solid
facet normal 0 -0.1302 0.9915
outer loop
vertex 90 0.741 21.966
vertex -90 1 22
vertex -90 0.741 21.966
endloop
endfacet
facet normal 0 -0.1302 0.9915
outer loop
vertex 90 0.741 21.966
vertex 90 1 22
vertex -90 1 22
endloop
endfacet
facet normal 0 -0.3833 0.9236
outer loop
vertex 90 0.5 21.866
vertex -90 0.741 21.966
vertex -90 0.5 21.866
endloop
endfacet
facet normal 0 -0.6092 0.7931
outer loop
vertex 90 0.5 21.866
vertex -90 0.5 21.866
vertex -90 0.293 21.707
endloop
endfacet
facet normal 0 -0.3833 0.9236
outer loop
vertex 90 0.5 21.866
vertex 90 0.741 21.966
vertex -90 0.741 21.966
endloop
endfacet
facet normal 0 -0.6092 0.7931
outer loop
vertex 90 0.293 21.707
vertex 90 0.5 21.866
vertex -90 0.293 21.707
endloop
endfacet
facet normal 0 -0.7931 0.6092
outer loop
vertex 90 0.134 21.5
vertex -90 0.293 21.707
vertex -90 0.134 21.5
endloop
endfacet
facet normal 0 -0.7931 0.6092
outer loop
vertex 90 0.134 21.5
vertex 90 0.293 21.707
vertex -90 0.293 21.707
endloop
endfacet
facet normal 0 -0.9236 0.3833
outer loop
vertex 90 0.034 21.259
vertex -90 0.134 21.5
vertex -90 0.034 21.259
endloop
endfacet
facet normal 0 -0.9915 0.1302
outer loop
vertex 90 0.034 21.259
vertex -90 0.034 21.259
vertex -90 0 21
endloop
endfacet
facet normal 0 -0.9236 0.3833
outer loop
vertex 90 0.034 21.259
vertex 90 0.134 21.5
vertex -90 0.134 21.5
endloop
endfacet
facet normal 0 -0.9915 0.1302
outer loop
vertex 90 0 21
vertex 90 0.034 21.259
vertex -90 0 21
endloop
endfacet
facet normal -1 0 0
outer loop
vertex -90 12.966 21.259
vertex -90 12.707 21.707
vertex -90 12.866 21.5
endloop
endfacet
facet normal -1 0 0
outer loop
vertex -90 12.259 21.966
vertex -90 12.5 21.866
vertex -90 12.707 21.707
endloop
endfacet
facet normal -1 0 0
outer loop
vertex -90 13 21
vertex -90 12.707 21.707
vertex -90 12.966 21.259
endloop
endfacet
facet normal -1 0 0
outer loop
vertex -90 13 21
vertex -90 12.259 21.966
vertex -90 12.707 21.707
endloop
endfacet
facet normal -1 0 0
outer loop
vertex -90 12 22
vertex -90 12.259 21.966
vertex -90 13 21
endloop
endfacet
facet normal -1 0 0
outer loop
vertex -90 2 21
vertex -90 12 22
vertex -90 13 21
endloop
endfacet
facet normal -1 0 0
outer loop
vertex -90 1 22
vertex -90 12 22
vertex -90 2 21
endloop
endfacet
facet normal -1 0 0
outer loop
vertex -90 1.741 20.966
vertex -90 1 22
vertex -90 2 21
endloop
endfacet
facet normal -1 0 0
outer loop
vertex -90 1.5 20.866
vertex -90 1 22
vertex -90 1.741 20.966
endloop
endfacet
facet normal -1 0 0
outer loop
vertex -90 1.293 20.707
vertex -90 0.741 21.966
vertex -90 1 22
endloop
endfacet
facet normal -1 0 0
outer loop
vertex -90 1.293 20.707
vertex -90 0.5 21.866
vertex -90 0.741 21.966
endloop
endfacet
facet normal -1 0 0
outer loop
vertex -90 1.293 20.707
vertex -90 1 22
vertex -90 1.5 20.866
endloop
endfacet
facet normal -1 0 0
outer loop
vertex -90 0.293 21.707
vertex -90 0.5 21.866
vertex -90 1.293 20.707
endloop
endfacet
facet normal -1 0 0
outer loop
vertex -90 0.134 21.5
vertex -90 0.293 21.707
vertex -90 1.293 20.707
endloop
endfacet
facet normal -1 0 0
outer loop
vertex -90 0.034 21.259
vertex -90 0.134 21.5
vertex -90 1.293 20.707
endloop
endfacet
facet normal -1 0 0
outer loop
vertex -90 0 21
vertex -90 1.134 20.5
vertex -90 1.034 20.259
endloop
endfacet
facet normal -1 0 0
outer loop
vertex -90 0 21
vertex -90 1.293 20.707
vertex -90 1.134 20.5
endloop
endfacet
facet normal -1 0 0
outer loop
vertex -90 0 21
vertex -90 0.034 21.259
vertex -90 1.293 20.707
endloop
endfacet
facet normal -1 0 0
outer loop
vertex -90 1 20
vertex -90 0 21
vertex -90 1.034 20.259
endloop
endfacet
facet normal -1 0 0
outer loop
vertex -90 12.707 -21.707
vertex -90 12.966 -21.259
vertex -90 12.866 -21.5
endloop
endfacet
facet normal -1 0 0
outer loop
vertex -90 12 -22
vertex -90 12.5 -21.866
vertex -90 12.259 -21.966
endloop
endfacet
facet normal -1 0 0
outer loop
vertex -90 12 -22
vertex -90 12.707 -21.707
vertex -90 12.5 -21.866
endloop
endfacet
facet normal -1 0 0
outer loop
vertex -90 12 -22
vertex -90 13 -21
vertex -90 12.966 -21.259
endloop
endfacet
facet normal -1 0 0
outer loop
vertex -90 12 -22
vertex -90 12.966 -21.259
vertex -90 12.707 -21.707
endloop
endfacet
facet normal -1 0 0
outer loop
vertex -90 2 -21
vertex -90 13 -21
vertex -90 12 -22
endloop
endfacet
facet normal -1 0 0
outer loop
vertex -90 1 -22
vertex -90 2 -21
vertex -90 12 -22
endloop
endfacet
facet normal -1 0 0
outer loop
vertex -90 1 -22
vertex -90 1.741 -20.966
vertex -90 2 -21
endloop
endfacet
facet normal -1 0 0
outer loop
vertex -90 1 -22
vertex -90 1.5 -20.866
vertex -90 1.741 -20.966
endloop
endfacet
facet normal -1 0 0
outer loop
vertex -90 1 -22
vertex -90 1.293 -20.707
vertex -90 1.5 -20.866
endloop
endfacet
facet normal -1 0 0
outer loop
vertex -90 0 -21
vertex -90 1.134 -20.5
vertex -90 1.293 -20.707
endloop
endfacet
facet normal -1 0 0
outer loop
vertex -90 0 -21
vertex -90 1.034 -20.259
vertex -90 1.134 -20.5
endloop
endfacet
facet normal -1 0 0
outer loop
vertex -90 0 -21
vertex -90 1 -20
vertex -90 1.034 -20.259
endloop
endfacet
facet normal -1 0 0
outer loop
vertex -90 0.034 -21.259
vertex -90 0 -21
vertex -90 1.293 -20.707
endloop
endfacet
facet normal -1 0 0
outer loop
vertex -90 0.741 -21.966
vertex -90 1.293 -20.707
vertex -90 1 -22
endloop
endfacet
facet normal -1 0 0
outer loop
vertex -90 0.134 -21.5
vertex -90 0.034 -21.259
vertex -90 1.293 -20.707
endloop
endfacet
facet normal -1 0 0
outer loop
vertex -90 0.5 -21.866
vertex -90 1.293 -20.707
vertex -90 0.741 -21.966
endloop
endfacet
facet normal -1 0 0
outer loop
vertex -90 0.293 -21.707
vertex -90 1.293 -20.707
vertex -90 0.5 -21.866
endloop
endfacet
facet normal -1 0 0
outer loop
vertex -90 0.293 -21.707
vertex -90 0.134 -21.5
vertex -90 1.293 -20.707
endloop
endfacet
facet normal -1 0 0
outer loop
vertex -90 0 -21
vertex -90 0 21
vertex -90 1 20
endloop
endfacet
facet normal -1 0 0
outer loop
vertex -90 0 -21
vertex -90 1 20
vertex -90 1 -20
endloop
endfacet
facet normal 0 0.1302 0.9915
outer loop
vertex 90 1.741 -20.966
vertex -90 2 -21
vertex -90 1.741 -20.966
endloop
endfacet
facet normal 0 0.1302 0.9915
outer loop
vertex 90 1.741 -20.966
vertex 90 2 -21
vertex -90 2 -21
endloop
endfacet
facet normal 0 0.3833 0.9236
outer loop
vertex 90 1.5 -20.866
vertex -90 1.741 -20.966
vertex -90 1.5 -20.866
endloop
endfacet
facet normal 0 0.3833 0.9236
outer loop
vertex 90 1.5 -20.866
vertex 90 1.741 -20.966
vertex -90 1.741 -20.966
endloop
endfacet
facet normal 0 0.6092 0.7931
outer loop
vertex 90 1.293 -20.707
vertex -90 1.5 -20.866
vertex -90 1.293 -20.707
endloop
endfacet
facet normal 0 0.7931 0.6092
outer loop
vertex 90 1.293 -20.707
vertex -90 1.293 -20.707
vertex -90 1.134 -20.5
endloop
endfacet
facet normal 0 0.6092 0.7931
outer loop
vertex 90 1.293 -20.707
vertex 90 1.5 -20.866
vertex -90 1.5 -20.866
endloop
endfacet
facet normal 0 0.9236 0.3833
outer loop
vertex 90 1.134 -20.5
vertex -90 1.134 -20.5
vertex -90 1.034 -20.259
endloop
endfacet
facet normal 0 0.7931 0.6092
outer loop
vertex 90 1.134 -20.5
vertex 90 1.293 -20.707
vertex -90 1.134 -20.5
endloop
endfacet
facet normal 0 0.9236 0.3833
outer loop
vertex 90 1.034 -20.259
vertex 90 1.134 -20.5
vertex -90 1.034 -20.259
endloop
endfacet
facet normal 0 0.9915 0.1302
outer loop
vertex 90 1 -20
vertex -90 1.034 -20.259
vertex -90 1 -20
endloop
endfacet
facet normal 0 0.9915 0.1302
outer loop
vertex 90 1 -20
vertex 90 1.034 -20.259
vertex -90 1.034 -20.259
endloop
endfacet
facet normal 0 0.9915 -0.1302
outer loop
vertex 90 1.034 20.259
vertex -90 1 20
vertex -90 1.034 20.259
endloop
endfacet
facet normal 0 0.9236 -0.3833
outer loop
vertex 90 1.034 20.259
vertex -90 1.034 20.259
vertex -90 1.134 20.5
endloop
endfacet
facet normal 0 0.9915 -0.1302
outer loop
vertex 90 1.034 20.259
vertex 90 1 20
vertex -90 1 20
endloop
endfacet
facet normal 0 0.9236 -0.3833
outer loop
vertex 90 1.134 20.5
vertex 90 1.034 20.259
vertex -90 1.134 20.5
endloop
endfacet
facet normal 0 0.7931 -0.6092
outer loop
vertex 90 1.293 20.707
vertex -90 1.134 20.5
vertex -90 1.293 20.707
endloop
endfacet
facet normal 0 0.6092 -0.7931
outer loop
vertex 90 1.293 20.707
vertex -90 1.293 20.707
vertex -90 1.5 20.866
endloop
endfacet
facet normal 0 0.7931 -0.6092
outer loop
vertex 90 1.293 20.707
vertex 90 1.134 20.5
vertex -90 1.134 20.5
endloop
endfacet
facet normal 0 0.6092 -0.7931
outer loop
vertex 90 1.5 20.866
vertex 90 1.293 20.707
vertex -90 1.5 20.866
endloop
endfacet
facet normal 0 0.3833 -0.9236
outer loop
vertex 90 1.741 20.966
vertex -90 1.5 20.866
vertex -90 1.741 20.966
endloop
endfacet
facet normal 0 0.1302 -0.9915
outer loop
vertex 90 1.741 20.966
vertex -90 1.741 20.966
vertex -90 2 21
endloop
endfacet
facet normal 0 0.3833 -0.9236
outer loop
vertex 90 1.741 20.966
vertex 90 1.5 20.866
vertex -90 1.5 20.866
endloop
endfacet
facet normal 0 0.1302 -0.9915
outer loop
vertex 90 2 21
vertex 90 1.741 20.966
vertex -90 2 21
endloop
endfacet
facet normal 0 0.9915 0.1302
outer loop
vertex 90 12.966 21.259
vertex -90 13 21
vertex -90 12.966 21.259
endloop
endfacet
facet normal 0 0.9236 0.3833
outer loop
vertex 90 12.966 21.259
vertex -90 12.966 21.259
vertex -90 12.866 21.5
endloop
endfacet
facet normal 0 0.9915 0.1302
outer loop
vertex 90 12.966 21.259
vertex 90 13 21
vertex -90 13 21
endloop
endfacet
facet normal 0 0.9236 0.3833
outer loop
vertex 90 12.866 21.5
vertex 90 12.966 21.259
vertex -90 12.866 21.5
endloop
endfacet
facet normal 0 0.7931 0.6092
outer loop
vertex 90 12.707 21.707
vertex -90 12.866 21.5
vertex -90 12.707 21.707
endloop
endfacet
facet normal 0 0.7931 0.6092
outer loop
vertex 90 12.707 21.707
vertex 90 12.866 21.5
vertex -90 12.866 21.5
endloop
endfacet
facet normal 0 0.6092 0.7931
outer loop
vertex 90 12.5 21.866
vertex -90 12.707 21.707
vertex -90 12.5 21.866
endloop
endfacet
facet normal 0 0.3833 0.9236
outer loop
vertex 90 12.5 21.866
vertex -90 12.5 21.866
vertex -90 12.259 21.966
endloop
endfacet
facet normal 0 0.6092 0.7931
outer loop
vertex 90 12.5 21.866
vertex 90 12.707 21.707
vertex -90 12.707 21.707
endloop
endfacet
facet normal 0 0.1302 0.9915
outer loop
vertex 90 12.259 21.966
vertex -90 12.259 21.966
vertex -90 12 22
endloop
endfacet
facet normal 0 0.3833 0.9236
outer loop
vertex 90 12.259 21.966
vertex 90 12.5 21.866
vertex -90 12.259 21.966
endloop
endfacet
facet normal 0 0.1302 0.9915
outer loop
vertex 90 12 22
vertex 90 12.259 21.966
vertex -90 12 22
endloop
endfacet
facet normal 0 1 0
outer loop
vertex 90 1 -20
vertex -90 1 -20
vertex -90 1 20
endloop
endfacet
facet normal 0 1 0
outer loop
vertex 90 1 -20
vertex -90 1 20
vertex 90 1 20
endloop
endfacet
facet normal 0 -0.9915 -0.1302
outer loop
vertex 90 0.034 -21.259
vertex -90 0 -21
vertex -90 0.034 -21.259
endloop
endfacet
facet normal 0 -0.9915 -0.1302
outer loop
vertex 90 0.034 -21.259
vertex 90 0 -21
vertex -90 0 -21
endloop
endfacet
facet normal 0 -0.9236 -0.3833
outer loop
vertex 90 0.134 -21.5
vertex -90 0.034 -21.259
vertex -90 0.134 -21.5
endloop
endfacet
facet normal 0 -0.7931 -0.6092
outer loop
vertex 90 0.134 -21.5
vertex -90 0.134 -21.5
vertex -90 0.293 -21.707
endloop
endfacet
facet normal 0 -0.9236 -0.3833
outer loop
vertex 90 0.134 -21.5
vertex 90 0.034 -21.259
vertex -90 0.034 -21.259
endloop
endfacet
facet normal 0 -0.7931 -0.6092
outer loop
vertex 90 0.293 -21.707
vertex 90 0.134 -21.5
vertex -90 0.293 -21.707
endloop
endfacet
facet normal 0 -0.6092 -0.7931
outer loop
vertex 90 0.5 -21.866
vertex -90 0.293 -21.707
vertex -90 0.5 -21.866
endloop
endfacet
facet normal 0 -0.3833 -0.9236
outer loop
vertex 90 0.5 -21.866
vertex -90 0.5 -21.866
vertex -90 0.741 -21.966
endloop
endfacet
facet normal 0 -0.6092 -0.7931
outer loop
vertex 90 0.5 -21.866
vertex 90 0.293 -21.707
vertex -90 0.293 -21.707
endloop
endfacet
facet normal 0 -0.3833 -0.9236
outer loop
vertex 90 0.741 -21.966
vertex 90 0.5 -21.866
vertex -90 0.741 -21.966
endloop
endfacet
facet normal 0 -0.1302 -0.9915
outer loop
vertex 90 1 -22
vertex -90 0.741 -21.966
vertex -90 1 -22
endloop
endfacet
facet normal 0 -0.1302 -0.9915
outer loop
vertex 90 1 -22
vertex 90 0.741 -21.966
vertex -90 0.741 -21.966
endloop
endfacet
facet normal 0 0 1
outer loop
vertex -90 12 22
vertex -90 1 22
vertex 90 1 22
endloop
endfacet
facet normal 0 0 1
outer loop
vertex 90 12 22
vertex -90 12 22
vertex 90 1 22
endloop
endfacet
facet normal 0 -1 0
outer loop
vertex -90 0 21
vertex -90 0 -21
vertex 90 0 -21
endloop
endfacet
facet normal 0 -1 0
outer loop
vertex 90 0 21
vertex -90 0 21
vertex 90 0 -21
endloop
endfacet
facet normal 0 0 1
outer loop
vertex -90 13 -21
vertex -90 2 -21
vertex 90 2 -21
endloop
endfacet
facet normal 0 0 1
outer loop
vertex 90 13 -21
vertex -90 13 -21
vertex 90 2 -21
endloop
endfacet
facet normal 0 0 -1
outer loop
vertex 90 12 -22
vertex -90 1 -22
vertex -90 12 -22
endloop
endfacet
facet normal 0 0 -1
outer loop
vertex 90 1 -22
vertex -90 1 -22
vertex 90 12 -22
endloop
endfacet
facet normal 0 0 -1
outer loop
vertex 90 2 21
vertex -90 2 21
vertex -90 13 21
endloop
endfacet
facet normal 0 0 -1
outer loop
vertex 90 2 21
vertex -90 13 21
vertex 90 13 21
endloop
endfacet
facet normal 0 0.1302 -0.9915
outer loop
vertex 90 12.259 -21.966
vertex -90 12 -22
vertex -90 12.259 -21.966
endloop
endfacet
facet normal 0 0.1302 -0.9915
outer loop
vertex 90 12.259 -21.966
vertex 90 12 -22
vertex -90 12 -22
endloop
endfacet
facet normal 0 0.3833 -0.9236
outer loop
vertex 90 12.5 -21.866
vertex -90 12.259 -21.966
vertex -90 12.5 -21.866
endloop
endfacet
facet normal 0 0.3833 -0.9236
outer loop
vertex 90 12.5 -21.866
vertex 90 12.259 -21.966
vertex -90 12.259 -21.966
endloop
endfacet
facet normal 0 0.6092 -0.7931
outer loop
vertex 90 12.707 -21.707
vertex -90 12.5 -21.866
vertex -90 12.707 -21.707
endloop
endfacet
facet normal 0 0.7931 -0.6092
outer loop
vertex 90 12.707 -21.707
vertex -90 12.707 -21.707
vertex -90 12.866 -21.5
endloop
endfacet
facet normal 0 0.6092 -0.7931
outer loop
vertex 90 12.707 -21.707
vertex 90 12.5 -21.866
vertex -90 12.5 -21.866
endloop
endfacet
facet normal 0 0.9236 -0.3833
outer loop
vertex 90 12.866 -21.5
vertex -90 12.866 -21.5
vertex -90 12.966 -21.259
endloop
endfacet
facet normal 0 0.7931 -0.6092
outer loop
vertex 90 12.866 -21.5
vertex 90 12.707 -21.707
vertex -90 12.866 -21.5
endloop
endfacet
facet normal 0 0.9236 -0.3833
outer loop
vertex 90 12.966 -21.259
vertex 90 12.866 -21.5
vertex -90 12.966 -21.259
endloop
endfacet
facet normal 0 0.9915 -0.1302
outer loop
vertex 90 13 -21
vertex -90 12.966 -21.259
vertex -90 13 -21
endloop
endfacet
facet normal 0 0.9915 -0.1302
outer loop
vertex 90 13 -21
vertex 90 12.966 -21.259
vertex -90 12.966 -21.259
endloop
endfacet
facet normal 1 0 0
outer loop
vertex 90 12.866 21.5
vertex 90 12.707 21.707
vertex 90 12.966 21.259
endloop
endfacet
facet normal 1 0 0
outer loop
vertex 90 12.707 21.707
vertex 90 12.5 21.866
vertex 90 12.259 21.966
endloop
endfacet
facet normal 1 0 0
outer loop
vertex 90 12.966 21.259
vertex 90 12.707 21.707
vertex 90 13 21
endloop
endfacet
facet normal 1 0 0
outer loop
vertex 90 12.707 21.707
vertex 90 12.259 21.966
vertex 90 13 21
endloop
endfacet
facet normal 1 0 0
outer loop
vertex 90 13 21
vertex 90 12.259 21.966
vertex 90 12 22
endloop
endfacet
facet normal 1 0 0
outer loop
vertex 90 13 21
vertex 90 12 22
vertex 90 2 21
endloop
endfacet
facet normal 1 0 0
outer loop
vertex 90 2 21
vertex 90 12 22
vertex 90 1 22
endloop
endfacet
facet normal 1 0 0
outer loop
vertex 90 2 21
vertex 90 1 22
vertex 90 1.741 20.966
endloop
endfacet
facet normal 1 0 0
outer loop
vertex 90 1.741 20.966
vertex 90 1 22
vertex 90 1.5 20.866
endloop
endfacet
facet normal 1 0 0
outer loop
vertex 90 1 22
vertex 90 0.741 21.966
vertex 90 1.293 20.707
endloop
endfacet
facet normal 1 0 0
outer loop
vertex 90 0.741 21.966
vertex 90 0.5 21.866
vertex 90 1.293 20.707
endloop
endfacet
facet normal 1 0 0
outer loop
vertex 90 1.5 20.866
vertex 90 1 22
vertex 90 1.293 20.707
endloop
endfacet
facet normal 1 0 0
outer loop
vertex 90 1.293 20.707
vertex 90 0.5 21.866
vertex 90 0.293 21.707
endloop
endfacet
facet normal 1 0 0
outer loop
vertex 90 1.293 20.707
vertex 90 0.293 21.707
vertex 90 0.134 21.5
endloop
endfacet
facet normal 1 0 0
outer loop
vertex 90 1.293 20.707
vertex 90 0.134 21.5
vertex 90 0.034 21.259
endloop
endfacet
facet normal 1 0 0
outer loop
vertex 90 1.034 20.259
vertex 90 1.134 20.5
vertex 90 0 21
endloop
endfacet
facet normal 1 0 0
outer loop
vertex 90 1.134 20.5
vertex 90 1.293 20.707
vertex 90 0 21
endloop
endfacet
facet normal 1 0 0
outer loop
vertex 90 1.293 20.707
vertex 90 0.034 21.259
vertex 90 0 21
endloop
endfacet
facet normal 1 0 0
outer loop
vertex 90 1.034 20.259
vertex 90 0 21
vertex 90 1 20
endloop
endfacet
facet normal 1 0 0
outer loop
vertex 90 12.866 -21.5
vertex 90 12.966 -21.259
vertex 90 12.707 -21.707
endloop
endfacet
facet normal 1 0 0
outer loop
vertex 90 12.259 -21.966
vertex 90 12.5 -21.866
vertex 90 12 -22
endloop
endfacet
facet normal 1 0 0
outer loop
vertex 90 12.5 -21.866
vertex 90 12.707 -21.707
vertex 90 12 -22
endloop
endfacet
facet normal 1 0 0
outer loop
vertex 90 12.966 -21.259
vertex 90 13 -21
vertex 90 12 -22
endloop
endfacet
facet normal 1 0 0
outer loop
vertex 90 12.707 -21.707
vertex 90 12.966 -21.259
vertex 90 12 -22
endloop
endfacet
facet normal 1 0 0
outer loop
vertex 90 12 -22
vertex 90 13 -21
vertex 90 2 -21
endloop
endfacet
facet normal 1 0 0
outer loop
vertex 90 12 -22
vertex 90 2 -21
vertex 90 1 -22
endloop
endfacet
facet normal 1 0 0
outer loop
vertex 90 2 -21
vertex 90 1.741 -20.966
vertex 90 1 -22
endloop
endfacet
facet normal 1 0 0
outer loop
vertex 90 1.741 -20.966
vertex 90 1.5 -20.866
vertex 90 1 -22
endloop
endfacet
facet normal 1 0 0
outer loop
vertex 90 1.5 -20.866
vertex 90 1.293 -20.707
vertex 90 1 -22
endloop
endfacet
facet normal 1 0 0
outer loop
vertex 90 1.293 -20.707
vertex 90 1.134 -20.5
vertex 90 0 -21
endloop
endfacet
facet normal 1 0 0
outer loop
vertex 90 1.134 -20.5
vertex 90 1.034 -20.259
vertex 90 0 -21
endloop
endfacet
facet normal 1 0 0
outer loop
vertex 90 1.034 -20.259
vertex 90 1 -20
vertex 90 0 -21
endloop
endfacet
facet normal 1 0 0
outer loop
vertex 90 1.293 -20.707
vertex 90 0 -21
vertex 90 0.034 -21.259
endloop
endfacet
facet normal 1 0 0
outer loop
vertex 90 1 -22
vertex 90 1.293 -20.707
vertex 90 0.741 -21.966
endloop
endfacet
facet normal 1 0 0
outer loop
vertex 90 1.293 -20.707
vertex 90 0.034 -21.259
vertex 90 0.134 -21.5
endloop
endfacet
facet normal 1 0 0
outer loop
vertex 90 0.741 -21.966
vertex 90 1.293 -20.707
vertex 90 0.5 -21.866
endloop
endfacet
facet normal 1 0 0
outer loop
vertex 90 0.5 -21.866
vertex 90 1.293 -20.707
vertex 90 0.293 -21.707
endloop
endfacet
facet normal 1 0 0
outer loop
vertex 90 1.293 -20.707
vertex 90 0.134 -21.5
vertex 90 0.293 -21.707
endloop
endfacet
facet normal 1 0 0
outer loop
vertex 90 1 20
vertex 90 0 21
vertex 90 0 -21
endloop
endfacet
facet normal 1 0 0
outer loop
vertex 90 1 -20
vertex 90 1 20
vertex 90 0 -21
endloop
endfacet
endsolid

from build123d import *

# Parameters (mm, degrees)
SKETCH1_W           = 180
SKETCH1_H           = 44
BOSS_EXTRUDE1_DEPTH = 1
SKETCH2_W           = 180
SKETCH2_H           = 1
BOSS_EXTRUDE2_DEPTH = 12
FILLET1_R           = 1
FILLET2_R           = 1
FILLET3_R           = 1
FILLET4_R           = 1
FILLET5_R           = 1
FILLET6_R           = 1


with BuildPart() as part:
    # Sketch1 → Boss-Extrude1 (new body)
    with BuildSketch(Plane(origin=(0, 0, 0), x_dir=(1, 0, 0), z_dir=(0, 1, 0))):
        Rectangle(SKETCH1_W, SKETCH1_H)
    extrude(amount=BOSS_EXTRUDE1_DEPTH)

    # Sketch2 → Boss-Extrude2 (add)
    with BuildSketch(Plane(origin=(0, 1, 0), x_dir=(1, 0, 0), z_dir=(0, 1, 0))):
        with Locations((0, 21.5)):
            Rectangle(SKETCH2_W, SKETCH2_H)
        with Locations((0, -21.5)):
            Rectangle(SKETCH2_W, SKETCH2_H)
    extrude(amount=BOSS_EXTRUDE2_DEPTH)

    # Fillet1
    fillet1_edges = [part.edges().sort_by_distance(p)[0] for p in [
        (0, 13, 22),
    ]]
    fillet(fillet1_edges, radius=FILLET1_R - 0.0001)  # a hair under: the kernel refuses the full size

    # Fillet2
    fillet2_edges = [part.edges().sort_by_distance(p)[0] for p in [
        (0, 13, -22),
    ]]
    fillet(fillet2_edges, radius=FILLET2_R - 0.0001)  # a hair under: the kernel refuses the full size

    # Fillet3
    fillet3_edges = [part.edges().sort_by_distance(p)[0] for p in [
        (0, 1, -21),
    ]]
    fillet(fillet3_edges, radius=FILLET3_R)

    # Fillet4
    fillet4_edges = [part.edges().sort_by_distance(p)[0] for p in [
        (0, 1, 21),
    ]]
    fillet(fillet4_edges, radius=FILLET4_R)

    # Fillet5
    fillet5_edges = [part.edges().sort_by_distance(p)[0] for p in [
        (0, 0, 22),
    ]]
    fillet(fillet5_edges, radius=FILLET5_R)

    # Fillet6
    fillet6_edges = [part.edges().sort_by_distance(p)[0] for p in [
        (0, 0, -22),
    ]]
    fillet(fillet6_edges, radius=FILLET6_R)


solid = part.part
